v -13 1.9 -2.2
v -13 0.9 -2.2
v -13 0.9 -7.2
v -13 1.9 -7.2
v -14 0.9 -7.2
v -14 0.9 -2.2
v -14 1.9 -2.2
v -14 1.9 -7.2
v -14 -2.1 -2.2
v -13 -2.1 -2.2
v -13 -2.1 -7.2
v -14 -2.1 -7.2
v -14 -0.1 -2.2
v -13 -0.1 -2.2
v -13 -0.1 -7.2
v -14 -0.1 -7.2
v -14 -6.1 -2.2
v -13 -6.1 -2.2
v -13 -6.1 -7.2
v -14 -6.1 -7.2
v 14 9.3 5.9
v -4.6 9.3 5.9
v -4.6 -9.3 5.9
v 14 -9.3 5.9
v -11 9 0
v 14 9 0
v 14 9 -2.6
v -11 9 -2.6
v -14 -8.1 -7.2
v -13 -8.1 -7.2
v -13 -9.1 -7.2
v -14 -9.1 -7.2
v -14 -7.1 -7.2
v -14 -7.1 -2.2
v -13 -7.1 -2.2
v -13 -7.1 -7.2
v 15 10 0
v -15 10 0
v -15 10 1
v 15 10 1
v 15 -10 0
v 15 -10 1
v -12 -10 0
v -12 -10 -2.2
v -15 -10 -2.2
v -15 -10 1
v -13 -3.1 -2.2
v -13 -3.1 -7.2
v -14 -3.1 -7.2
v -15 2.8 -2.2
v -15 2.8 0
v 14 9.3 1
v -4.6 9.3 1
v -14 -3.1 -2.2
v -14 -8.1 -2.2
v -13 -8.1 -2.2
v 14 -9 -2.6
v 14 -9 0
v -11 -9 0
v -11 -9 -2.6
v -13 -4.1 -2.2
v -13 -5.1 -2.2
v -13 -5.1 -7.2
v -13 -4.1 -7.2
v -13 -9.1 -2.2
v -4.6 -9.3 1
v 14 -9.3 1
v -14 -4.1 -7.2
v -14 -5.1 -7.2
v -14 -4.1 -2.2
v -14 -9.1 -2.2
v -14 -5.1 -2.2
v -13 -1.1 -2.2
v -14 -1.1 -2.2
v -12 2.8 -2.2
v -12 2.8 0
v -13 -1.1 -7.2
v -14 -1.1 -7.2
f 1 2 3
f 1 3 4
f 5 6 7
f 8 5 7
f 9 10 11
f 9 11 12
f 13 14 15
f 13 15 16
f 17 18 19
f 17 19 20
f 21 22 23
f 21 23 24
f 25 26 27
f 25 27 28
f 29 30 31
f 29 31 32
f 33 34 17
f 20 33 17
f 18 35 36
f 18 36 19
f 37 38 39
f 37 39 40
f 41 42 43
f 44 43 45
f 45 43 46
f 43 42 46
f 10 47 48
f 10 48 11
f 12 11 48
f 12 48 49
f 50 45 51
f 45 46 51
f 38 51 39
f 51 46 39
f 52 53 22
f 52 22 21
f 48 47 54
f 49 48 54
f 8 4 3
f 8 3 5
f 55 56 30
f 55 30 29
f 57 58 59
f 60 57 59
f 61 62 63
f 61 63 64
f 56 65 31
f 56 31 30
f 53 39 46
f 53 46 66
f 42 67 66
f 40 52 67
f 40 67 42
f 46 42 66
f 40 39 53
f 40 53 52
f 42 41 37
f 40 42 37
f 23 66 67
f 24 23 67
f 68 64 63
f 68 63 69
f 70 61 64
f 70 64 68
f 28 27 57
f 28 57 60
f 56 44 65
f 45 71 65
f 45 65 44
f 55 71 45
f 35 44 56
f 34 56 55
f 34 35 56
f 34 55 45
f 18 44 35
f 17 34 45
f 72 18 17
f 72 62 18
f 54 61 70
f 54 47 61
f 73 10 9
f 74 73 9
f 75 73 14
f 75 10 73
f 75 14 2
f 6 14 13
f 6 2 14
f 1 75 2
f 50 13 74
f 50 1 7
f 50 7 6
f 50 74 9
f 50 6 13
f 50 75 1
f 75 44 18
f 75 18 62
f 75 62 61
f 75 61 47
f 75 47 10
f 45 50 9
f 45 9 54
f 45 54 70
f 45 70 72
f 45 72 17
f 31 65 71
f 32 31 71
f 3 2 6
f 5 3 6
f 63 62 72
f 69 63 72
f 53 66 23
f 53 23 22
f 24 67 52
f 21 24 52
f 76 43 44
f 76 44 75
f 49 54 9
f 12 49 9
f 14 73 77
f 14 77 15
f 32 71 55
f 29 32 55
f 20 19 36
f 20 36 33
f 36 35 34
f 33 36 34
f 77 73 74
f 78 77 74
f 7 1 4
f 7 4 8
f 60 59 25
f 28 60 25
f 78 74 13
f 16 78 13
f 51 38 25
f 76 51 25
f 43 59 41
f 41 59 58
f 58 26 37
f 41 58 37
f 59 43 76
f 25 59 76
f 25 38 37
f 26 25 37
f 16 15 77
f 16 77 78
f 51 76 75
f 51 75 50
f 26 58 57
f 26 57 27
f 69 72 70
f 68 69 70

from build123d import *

# Parameters (mm, degrees)
SKETCH1_W           = 30
SKETCH1_H           = 20
BOSS_EXTRUDE1_DEPTH = 1
SKETCH2_W           = 3
SKETCH2_H           = 12.8
BOSS_EXTRUDE2_DEPTH = 2.2
SKETCH3_W           = 1
SKETCH3_H           = 1
BOSS_EXTRUDE3_DEPTH = 5
LPATTERN1_COUNT     = 6
LPATTERN1_PITCH     = 2
SKETCH4_W           = 25
SKETCH4_H           = 18
BOSS_EXTRUDE4_DEPTH = 2.6
SKETCH5_W           = 18.6
SKETCH5_H           = 18.6
BOSS_EXTRUDE5_DEPTH = 4.9


with BuildPart() as part:
    # Sketch1 → Boss-Extrude1 (new body)
    with BuildSketch(Plane.XY):
        Rectangle(SKETCH1_W, SKETCH1_H)
    extrude(amount=BOSS_EXTRUDE1_DEPTH)

    # Sketch2 → Boss-Extrude2 (add)
    with BuildSketch(Plane(origin=(0, 0, 0), x_dir=(-1, 0, 0), z_dir=(0, 0, -1))):
        with Locations((13.5, -3.6)):
            Rectangle(SKETCH2_W, SKETCH2_H)
    extrude(amount=BOSS_EXTRUDE2_DEPTH)

    # Sketch3 → Boss-Extrude3 (add)
    with BuildSketch(Plane(origin=(0, 0, -2.2), x_dir=(-1, 0, 0), z_dir=(0, 0, -1))):
        with Locations((13.5, -8.6)):
            Rectangle(SKETCH3_W, SKETCH3_H)
    boss_extrude3 = extrude(amount=BOSS_EXTRUDE3_DEPTH)

    # LPattern1: Boss-Extrude3 ×6
    with Locations(*[(0, i * LPATTERN1_PITCH, 0) for i in range(1, LPATTERN1_COUNT)]):
        add(boss_extrude3)

    # Sketch4 → Boss-Extrude4 (add)
    with BuildSketch(Plane(origin=(0, 0, 0), x_dir=(-1, 0, 0), z_dir=(0, 0, -1))):
        with Locations((-1.5, 0)):
            Rectangle(SKETCH4_W, SKETCH4_H)
    extrude(amount=BOSS_EXTRUDE4_DEPTH)

    # Sketch5 → Boss-Extrude5 (add)
    with BuildSketch(Plane.XY.offset(1)):
        with Locations((4.7, 0)):
            Rectangle(SKETCH5_W, SKETCH5_H)
    extrude(amount=BOSS_EXTRUDE5_DEPTH)


solid = part.part
